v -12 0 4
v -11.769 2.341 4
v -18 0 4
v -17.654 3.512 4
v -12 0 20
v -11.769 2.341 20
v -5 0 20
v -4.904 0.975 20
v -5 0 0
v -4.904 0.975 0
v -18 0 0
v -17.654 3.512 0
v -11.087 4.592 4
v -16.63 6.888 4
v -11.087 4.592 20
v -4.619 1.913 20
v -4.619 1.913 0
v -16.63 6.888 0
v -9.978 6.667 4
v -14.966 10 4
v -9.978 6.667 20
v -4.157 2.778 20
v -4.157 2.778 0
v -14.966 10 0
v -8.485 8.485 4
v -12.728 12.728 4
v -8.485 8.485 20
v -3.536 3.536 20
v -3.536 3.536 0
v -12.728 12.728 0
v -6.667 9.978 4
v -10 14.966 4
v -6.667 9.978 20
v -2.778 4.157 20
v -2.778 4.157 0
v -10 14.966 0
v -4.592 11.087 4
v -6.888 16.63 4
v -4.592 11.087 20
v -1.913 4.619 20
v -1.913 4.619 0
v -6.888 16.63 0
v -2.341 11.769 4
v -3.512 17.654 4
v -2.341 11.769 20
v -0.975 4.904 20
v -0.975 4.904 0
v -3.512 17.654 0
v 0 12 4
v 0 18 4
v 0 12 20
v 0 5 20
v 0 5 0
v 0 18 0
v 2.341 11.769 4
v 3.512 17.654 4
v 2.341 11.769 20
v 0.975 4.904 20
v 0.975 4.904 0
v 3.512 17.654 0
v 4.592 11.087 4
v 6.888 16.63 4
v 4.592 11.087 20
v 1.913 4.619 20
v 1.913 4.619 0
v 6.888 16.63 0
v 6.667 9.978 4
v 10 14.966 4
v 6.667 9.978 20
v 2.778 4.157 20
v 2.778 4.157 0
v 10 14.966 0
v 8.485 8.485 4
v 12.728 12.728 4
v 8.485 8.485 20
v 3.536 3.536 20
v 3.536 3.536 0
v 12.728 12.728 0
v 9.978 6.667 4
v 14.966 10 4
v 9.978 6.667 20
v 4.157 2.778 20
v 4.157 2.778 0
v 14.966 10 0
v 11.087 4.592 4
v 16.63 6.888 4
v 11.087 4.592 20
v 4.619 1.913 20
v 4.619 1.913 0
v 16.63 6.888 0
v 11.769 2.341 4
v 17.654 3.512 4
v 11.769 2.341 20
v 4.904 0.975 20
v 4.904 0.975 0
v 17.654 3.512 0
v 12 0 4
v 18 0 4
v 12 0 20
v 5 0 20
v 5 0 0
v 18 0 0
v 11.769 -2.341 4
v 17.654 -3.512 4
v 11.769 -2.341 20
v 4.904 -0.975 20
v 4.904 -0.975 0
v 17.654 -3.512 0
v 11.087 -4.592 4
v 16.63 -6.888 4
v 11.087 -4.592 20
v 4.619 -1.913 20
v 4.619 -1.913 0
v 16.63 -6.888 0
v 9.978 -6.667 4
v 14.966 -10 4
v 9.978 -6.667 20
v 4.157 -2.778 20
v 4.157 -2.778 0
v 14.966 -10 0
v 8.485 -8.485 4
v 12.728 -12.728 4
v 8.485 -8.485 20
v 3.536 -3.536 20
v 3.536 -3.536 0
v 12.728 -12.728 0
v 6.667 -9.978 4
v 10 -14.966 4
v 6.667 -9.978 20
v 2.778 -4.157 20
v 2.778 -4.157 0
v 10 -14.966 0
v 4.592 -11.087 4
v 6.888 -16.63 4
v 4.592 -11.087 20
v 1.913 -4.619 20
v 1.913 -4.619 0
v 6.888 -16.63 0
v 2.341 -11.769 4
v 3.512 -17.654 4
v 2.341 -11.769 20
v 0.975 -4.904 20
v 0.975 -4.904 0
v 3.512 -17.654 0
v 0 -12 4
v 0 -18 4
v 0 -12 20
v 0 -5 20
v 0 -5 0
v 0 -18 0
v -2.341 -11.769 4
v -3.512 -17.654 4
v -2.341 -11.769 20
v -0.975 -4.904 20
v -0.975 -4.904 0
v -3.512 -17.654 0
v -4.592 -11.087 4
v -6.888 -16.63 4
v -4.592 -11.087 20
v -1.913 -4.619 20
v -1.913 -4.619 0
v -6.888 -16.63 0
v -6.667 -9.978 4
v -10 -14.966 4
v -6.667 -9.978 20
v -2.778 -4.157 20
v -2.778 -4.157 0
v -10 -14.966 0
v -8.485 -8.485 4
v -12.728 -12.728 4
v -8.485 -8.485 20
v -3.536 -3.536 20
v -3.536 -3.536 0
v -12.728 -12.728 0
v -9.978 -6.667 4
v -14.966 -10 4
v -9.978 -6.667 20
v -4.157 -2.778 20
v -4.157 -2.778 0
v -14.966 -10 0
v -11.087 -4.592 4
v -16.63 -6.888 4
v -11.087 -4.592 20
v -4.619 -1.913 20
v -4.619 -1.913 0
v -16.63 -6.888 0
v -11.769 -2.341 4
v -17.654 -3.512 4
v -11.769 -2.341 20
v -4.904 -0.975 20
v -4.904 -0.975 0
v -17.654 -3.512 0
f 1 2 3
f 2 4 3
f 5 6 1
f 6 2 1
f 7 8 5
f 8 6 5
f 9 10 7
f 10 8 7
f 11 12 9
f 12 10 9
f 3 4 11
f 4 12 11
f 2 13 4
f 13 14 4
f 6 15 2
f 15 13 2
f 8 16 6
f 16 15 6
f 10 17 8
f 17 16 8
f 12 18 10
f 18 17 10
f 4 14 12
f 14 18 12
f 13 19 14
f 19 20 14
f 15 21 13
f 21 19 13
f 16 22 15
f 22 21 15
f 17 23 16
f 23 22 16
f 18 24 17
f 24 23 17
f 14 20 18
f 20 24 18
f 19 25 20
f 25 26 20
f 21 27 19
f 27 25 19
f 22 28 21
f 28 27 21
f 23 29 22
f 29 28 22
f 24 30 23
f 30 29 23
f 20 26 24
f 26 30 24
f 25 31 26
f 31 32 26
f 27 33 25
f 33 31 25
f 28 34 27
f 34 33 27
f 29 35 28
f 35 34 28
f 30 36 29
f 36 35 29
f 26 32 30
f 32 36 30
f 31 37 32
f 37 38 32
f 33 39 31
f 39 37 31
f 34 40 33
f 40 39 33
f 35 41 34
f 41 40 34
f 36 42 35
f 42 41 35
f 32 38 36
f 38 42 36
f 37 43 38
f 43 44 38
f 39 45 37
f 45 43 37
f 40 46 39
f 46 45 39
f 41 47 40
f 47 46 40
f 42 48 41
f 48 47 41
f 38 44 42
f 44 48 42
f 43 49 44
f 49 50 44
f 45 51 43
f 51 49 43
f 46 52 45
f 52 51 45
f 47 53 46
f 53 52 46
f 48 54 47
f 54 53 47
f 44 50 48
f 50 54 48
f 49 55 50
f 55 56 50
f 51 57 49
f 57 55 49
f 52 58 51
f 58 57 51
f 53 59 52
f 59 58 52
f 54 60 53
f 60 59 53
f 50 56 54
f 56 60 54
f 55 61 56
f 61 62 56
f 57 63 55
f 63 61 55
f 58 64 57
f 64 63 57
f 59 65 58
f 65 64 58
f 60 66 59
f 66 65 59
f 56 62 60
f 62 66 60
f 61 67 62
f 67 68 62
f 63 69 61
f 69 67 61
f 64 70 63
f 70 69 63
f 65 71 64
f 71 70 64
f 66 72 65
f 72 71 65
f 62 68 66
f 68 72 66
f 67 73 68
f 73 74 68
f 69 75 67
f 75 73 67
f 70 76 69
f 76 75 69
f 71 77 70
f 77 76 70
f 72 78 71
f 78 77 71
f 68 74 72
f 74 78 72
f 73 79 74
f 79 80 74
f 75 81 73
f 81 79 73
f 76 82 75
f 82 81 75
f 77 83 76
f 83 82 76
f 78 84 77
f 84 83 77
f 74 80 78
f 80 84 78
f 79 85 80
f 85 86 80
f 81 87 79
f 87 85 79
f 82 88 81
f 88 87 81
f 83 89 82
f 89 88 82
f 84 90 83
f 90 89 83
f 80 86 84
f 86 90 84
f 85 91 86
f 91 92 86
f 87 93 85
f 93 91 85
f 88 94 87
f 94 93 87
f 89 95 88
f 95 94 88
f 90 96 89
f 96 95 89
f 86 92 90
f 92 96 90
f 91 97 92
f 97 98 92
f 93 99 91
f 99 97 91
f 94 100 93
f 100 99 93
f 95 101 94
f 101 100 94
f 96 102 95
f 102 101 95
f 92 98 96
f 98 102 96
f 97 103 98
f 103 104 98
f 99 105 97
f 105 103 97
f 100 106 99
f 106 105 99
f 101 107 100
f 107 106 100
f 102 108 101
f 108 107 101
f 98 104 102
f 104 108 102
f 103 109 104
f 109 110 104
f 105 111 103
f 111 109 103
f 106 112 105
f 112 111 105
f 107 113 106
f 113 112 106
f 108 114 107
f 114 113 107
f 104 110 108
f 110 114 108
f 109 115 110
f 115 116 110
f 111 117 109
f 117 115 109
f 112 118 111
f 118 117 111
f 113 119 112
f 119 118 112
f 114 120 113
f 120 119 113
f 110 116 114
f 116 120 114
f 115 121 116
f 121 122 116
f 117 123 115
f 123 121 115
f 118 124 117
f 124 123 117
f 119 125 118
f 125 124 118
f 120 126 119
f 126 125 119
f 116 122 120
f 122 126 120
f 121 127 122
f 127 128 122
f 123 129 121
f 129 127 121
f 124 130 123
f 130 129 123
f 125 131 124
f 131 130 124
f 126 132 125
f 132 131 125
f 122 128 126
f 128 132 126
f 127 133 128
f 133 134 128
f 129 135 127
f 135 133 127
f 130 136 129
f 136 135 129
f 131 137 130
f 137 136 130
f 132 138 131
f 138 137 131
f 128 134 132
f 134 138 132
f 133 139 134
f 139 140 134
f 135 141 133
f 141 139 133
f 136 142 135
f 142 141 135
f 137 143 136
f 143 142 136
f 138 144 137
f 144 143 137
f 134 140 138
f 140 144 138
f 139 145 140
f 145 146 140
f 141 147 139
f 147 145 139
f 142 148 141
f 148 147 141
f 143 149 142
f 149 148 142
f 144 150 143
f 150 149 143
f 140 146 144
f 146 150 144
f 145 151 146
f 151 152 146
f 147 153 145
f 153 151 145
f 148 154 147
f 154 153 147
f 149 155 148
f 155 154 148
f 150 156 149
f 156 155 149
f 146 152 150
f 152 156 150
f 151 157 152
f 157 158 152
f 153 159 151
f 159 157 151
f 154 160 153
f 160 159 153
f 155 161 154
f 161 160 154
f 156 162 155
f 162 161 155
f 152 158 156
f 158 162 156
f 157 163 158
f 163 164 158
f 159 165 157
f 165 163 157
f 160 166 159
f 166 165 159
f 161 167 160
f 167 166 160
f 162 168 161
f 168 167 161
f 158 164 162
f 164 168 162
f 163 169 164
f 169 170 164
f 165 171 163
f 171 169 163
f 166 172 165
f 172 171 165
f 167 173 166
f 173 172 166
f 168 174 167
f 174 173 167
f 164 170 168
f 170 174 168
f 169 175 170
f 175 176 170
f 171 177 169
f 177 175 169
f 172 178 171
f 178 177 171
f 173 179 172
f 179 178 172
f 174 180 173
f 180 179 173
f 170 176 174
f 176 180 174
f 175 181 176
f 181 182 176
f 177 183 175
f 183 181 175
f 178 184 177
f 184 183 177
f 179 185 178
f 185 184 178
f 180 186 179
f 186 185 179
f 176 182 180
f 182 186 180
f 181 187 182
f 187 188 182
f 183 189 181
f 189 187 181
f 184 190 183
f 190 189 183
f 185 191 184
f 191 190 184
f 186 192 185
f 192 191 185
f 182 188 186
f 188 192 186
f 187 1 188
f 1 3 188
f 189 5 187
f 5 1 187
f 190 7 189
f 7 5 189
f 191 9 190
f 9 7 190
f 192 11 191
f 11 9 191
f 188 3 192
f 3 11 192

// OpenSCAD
$fn = 32;

// ----------------------------------------------------------------------
// Revolved part: flanged bushing R18
// ----------------------------------------------------------------------

// --- parameters (mm) ---
bore_r = 5;               // bore radius
flange_r = 18;            // flange radius
flange_h = 4;             // flange thickness
sleeve_r = 12;            // sleeve radius
total_h = 20;             // overall height
revolve_angle = 360;      // revolve sweep, degrees

bore_d = 2 * bore_r;
flange_d = 2 * flange_r;
sleeve_d = 2 * sleeve_r;

profile = [[5, 0], [18, 0], [18, 4], [12, 4], [12, 20], [5, 20]];  // primary outline, 6 points, counter clockwise

// --- the one profile operation ---
rotate_extrude(angle = revolve_angle) polygon(points = profile);
